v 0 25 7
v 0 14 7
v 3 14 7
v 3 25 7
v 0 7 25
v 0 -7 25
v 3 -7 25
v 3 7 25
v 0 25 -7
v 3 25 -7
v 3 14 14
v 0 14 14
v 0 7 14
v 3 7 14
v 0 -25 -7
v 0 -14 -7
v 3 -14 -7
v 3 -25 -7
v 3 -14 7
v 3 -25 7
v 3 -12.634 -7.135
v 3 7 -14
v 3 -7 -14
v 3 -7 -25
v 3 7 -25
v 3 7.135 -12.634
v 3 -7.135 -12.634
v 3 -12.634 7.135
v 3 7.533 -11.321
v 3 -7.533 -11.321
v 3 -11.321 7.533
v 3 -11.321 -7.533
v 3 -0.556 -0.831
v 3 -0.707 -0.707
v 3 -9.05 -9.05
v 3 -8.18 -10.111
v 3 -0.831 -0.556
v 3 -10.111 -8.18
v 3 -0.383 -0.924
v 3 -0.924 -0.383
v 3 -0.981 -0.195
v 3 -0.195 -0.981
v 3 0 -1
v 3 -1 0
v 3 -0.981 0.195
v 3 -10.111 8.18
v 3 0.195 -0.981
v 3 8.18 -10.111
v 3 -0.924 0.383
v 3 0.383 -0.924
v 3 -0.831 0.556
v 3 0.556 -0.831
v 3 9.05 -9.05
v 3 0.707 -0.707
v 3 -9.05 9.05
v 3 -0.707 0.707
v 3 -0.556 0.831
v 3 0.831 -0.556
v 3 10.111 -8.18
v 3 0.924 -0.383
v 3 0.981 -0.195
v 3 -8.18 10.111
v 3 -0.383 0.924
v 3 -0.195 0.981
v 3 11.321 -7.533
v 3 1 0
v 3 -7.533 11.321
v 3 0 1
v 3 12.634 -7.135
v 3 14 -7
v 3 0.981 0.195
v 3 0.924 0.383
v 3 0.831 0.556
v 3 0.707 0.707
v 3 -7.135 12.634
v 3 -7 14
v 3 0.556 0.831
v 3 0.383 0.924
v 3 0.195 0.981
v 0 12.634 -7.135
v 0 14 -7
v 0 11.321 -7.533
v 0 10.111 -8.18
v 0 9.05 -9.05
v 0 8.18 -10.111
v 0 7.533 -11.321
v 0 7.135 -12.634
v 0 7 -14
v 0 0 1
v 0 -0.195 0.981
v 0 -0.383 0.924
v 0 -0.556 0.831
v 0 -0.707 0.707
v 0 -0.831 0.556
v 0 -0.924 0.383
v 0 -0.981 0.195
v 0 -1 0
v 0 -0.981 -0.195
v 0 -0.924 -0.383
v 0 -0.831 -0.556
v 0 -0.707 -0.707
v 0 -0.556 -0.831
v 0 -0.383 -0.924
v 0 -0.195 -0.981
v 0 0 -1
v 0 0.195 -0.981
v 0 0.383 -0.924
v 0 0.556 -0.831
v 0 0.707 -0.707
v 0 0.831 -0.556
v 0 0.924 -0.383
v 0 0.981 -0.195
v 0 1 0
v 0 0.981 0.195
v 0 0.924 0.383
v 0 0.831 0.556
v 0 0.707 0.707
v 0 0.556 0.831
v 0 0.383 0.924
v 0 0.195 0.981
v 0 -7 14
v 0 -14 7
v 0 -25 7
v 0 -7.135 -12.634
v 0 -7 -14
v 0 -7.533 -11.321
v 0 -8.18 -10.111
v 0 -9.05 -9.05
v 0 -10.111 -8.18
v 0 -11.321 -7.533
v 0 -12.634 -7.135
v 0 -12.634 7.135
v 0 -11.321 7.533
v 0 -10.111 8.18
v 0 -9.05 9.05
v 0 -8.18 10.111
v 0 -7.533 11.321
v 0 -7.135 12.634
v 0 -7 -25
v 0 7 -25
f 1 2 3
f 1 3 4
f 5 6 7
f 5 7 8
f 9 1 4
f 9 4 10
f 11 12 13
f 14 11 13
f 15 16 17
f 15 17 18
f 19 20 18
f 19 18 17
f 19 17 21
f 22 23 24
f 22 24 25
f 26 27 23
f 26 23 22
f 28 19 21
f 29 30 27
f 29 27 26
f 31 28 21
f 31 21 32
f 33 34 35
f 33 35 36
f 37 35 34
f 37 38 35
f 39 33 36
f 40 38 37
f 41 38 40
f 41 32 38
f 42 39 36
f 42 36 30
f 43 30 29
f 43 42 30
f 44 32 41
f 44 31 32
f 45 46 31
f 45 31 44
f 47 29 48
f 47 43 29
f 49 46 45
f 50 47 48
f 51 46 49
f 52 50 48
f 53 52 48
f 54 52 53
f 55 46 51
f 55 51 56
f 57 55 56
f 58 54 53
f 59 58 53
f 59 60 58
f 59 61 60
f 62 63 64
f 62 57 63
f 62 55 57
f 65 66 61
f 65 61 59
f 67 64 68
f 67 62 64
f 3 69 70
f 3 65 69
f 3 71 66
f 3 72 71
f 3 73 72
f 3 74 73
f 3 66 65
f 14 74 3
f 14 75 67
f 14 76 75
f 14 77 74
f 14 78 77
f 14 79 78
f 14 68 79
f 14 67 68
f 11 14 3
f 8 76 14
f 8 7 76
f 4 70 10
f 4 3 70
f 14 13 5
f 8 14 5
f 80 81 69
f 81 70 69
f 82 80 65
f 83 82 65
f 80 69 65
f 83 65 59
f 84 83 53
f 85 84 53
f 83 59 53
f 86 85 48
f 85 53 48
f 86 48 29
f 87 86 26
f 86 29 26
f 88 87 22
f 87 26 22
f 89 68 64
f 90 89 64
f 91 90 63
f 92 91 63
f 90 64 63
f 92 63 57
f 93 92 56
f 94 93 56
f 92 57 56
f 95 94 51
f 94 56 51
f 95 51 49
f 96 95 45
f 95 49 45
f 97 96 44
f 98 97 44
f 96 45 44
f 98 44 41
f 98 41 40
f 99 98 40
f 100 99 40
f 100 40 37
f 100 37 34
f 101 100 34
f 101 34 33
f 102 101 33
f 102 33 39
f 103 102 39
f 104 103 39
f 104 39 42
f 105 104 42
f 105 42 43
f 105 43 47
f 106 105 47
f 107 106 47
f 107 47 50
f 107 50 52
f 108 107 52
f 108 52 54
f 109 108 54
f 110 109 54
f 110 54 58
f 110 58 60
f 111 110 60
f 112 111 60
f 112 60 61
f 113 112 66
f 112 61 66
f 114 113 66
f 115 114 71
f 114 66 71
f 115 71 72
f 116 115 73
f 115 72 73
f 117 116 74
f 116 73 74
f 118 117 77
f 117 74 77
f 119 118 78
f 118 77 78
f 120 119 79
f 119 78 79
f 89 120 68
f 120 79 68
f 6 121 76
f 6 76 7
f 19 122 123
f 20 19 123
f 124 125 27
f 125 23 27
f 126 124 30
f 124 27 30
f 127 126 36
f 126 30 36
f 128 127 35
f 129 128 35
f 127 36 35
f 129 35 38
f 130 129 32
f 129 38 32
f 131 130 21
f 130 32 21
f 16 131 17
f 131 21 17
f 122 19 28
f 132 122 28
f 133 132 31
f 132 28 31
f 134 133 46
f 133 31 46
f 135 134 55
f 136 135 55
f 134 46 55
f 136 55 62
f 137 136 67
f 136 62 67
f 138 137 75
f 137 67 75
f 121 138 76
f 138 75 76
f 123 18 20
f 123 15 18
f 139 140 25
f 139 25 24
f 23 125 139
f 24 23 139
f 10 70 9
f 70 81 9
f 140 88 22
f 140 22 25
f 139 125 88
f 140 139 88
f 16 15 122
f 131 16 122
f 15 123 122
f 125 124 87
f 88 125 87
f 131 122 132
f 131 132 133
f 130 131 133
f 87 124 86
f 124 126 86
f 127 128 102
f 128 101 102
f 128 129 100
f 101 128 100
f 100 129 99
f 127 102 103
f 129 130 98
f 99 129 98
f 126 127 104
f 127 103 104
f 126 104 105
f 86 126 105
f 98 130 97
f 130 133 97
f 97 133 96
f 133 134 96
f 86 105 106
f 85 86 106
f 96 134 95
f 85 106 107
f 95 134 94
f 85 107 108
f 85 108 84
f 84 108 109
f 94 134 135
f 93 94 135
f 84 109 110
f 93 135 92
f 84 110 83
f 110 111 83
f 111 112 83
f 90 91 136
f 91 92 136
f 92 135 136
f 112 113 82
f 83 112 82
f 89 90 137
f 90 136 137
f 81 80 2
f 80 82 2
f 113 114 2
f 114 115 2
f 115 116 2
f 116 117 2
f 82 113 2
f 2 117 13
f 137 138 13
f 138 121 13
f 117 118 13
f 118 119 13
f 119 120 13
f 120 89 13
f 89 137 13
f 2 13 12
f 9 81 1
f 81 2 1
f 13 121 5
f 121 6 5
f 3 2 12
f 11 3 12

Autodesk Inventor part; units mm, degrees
ref_plane "YZ Plane" through (0, 0, 0) normal (1, 0, 0) x (0, 1, 0)
ref_plane "XZ Plane" through (0, 0, 0) normal (0, 1, 0) x (-1, 0, 0)
ref_plane "XY Plane" through (0, 0, 0) normal (0, 0, 1) x (1, 0, 0)
sketch "Skizze1" plane through (0, 0, 0) normal (1, 0, 0) x (0, 1, 0)
  line L0 (14, 14) -> (-14, 14)
  line L1 (-14, 14) -> (-14, -14)
  line L2 (-14, -14) -> (14, -14)
  line L3 (14, -14) -> (14, 14)
  line L4 (14, 14) -> (-14, -14) construction
  line L5 (-14, 14) -> (14, -14) construction
  line L6 (17, 17) -> (-17, -17) construction
  line L7 (-17, 17) -> (17, -17) construction
  line L8 (-17, 17) -> (-17, 25)
  line L9 (-17, 25) -> (17, 25)
  line L10 (17, 25) -> (17, 17)
  line L11 (17, 17) -> (25, 17)
  line L12 (25, 17) -> (25, -17)
  line L13 (25, -17) -> (17, -17)
  line L14 (17, -17) -> (17, -25)
  line L15 (17, -25) -> (-17, -25)
  line L16 (-17, -25) -> (-17, -17)
  line L17 (-17, -17) -> (-25, -17)
  line L18 (-25, -17) -> (-25, 17)
  line L19 (-25, 17) -> (-17, 17)
  line L20 (-7, 14) -> (-7, 25)
  line L21 (7, 14) -> (7, 25)
  line L22 (14, 7) -> (25, 7)
  line L23 (14, -7) -> (25, -7)
  line L24 (7, -14) -> (7, -25)
  line L25 (-7, -14) -> (-7, -25)
  line L26 (-14, -7) -> (-25, -7)
  line L27 (-14, 7) -> (-25, 7)
  point P0 (0, 0)
  dimension "d0" = 28
  dimension "d1" = 28
  dimension "d2" = 34
  dimension "d3" = 34
  dimension "d4" = 8
  dimension "d5" = 8
  dimension "d6" = 8
  dimension "d7" = 8
extrude "Extrusion1" add sketch "Skizze1" along normal blind 3 contours L3 L2 L1 L0 | L0 L20 L9 L21 | L22 L12 L23 L3 | L1 L26 L18 L27 | L24 L15 L25 L2
hole "Bohrung1" at (0, 14, -14) at (0, -14, -14) at (0, -14, 14) direction (1, 0, 0) diameter 14 end through all
hole "Bohrung2" at (0, 0, 0) direction (1, 0, 0) diameter 2 end through all
properties part number "Cube_Insert_Motion_adapter_srew_back"
